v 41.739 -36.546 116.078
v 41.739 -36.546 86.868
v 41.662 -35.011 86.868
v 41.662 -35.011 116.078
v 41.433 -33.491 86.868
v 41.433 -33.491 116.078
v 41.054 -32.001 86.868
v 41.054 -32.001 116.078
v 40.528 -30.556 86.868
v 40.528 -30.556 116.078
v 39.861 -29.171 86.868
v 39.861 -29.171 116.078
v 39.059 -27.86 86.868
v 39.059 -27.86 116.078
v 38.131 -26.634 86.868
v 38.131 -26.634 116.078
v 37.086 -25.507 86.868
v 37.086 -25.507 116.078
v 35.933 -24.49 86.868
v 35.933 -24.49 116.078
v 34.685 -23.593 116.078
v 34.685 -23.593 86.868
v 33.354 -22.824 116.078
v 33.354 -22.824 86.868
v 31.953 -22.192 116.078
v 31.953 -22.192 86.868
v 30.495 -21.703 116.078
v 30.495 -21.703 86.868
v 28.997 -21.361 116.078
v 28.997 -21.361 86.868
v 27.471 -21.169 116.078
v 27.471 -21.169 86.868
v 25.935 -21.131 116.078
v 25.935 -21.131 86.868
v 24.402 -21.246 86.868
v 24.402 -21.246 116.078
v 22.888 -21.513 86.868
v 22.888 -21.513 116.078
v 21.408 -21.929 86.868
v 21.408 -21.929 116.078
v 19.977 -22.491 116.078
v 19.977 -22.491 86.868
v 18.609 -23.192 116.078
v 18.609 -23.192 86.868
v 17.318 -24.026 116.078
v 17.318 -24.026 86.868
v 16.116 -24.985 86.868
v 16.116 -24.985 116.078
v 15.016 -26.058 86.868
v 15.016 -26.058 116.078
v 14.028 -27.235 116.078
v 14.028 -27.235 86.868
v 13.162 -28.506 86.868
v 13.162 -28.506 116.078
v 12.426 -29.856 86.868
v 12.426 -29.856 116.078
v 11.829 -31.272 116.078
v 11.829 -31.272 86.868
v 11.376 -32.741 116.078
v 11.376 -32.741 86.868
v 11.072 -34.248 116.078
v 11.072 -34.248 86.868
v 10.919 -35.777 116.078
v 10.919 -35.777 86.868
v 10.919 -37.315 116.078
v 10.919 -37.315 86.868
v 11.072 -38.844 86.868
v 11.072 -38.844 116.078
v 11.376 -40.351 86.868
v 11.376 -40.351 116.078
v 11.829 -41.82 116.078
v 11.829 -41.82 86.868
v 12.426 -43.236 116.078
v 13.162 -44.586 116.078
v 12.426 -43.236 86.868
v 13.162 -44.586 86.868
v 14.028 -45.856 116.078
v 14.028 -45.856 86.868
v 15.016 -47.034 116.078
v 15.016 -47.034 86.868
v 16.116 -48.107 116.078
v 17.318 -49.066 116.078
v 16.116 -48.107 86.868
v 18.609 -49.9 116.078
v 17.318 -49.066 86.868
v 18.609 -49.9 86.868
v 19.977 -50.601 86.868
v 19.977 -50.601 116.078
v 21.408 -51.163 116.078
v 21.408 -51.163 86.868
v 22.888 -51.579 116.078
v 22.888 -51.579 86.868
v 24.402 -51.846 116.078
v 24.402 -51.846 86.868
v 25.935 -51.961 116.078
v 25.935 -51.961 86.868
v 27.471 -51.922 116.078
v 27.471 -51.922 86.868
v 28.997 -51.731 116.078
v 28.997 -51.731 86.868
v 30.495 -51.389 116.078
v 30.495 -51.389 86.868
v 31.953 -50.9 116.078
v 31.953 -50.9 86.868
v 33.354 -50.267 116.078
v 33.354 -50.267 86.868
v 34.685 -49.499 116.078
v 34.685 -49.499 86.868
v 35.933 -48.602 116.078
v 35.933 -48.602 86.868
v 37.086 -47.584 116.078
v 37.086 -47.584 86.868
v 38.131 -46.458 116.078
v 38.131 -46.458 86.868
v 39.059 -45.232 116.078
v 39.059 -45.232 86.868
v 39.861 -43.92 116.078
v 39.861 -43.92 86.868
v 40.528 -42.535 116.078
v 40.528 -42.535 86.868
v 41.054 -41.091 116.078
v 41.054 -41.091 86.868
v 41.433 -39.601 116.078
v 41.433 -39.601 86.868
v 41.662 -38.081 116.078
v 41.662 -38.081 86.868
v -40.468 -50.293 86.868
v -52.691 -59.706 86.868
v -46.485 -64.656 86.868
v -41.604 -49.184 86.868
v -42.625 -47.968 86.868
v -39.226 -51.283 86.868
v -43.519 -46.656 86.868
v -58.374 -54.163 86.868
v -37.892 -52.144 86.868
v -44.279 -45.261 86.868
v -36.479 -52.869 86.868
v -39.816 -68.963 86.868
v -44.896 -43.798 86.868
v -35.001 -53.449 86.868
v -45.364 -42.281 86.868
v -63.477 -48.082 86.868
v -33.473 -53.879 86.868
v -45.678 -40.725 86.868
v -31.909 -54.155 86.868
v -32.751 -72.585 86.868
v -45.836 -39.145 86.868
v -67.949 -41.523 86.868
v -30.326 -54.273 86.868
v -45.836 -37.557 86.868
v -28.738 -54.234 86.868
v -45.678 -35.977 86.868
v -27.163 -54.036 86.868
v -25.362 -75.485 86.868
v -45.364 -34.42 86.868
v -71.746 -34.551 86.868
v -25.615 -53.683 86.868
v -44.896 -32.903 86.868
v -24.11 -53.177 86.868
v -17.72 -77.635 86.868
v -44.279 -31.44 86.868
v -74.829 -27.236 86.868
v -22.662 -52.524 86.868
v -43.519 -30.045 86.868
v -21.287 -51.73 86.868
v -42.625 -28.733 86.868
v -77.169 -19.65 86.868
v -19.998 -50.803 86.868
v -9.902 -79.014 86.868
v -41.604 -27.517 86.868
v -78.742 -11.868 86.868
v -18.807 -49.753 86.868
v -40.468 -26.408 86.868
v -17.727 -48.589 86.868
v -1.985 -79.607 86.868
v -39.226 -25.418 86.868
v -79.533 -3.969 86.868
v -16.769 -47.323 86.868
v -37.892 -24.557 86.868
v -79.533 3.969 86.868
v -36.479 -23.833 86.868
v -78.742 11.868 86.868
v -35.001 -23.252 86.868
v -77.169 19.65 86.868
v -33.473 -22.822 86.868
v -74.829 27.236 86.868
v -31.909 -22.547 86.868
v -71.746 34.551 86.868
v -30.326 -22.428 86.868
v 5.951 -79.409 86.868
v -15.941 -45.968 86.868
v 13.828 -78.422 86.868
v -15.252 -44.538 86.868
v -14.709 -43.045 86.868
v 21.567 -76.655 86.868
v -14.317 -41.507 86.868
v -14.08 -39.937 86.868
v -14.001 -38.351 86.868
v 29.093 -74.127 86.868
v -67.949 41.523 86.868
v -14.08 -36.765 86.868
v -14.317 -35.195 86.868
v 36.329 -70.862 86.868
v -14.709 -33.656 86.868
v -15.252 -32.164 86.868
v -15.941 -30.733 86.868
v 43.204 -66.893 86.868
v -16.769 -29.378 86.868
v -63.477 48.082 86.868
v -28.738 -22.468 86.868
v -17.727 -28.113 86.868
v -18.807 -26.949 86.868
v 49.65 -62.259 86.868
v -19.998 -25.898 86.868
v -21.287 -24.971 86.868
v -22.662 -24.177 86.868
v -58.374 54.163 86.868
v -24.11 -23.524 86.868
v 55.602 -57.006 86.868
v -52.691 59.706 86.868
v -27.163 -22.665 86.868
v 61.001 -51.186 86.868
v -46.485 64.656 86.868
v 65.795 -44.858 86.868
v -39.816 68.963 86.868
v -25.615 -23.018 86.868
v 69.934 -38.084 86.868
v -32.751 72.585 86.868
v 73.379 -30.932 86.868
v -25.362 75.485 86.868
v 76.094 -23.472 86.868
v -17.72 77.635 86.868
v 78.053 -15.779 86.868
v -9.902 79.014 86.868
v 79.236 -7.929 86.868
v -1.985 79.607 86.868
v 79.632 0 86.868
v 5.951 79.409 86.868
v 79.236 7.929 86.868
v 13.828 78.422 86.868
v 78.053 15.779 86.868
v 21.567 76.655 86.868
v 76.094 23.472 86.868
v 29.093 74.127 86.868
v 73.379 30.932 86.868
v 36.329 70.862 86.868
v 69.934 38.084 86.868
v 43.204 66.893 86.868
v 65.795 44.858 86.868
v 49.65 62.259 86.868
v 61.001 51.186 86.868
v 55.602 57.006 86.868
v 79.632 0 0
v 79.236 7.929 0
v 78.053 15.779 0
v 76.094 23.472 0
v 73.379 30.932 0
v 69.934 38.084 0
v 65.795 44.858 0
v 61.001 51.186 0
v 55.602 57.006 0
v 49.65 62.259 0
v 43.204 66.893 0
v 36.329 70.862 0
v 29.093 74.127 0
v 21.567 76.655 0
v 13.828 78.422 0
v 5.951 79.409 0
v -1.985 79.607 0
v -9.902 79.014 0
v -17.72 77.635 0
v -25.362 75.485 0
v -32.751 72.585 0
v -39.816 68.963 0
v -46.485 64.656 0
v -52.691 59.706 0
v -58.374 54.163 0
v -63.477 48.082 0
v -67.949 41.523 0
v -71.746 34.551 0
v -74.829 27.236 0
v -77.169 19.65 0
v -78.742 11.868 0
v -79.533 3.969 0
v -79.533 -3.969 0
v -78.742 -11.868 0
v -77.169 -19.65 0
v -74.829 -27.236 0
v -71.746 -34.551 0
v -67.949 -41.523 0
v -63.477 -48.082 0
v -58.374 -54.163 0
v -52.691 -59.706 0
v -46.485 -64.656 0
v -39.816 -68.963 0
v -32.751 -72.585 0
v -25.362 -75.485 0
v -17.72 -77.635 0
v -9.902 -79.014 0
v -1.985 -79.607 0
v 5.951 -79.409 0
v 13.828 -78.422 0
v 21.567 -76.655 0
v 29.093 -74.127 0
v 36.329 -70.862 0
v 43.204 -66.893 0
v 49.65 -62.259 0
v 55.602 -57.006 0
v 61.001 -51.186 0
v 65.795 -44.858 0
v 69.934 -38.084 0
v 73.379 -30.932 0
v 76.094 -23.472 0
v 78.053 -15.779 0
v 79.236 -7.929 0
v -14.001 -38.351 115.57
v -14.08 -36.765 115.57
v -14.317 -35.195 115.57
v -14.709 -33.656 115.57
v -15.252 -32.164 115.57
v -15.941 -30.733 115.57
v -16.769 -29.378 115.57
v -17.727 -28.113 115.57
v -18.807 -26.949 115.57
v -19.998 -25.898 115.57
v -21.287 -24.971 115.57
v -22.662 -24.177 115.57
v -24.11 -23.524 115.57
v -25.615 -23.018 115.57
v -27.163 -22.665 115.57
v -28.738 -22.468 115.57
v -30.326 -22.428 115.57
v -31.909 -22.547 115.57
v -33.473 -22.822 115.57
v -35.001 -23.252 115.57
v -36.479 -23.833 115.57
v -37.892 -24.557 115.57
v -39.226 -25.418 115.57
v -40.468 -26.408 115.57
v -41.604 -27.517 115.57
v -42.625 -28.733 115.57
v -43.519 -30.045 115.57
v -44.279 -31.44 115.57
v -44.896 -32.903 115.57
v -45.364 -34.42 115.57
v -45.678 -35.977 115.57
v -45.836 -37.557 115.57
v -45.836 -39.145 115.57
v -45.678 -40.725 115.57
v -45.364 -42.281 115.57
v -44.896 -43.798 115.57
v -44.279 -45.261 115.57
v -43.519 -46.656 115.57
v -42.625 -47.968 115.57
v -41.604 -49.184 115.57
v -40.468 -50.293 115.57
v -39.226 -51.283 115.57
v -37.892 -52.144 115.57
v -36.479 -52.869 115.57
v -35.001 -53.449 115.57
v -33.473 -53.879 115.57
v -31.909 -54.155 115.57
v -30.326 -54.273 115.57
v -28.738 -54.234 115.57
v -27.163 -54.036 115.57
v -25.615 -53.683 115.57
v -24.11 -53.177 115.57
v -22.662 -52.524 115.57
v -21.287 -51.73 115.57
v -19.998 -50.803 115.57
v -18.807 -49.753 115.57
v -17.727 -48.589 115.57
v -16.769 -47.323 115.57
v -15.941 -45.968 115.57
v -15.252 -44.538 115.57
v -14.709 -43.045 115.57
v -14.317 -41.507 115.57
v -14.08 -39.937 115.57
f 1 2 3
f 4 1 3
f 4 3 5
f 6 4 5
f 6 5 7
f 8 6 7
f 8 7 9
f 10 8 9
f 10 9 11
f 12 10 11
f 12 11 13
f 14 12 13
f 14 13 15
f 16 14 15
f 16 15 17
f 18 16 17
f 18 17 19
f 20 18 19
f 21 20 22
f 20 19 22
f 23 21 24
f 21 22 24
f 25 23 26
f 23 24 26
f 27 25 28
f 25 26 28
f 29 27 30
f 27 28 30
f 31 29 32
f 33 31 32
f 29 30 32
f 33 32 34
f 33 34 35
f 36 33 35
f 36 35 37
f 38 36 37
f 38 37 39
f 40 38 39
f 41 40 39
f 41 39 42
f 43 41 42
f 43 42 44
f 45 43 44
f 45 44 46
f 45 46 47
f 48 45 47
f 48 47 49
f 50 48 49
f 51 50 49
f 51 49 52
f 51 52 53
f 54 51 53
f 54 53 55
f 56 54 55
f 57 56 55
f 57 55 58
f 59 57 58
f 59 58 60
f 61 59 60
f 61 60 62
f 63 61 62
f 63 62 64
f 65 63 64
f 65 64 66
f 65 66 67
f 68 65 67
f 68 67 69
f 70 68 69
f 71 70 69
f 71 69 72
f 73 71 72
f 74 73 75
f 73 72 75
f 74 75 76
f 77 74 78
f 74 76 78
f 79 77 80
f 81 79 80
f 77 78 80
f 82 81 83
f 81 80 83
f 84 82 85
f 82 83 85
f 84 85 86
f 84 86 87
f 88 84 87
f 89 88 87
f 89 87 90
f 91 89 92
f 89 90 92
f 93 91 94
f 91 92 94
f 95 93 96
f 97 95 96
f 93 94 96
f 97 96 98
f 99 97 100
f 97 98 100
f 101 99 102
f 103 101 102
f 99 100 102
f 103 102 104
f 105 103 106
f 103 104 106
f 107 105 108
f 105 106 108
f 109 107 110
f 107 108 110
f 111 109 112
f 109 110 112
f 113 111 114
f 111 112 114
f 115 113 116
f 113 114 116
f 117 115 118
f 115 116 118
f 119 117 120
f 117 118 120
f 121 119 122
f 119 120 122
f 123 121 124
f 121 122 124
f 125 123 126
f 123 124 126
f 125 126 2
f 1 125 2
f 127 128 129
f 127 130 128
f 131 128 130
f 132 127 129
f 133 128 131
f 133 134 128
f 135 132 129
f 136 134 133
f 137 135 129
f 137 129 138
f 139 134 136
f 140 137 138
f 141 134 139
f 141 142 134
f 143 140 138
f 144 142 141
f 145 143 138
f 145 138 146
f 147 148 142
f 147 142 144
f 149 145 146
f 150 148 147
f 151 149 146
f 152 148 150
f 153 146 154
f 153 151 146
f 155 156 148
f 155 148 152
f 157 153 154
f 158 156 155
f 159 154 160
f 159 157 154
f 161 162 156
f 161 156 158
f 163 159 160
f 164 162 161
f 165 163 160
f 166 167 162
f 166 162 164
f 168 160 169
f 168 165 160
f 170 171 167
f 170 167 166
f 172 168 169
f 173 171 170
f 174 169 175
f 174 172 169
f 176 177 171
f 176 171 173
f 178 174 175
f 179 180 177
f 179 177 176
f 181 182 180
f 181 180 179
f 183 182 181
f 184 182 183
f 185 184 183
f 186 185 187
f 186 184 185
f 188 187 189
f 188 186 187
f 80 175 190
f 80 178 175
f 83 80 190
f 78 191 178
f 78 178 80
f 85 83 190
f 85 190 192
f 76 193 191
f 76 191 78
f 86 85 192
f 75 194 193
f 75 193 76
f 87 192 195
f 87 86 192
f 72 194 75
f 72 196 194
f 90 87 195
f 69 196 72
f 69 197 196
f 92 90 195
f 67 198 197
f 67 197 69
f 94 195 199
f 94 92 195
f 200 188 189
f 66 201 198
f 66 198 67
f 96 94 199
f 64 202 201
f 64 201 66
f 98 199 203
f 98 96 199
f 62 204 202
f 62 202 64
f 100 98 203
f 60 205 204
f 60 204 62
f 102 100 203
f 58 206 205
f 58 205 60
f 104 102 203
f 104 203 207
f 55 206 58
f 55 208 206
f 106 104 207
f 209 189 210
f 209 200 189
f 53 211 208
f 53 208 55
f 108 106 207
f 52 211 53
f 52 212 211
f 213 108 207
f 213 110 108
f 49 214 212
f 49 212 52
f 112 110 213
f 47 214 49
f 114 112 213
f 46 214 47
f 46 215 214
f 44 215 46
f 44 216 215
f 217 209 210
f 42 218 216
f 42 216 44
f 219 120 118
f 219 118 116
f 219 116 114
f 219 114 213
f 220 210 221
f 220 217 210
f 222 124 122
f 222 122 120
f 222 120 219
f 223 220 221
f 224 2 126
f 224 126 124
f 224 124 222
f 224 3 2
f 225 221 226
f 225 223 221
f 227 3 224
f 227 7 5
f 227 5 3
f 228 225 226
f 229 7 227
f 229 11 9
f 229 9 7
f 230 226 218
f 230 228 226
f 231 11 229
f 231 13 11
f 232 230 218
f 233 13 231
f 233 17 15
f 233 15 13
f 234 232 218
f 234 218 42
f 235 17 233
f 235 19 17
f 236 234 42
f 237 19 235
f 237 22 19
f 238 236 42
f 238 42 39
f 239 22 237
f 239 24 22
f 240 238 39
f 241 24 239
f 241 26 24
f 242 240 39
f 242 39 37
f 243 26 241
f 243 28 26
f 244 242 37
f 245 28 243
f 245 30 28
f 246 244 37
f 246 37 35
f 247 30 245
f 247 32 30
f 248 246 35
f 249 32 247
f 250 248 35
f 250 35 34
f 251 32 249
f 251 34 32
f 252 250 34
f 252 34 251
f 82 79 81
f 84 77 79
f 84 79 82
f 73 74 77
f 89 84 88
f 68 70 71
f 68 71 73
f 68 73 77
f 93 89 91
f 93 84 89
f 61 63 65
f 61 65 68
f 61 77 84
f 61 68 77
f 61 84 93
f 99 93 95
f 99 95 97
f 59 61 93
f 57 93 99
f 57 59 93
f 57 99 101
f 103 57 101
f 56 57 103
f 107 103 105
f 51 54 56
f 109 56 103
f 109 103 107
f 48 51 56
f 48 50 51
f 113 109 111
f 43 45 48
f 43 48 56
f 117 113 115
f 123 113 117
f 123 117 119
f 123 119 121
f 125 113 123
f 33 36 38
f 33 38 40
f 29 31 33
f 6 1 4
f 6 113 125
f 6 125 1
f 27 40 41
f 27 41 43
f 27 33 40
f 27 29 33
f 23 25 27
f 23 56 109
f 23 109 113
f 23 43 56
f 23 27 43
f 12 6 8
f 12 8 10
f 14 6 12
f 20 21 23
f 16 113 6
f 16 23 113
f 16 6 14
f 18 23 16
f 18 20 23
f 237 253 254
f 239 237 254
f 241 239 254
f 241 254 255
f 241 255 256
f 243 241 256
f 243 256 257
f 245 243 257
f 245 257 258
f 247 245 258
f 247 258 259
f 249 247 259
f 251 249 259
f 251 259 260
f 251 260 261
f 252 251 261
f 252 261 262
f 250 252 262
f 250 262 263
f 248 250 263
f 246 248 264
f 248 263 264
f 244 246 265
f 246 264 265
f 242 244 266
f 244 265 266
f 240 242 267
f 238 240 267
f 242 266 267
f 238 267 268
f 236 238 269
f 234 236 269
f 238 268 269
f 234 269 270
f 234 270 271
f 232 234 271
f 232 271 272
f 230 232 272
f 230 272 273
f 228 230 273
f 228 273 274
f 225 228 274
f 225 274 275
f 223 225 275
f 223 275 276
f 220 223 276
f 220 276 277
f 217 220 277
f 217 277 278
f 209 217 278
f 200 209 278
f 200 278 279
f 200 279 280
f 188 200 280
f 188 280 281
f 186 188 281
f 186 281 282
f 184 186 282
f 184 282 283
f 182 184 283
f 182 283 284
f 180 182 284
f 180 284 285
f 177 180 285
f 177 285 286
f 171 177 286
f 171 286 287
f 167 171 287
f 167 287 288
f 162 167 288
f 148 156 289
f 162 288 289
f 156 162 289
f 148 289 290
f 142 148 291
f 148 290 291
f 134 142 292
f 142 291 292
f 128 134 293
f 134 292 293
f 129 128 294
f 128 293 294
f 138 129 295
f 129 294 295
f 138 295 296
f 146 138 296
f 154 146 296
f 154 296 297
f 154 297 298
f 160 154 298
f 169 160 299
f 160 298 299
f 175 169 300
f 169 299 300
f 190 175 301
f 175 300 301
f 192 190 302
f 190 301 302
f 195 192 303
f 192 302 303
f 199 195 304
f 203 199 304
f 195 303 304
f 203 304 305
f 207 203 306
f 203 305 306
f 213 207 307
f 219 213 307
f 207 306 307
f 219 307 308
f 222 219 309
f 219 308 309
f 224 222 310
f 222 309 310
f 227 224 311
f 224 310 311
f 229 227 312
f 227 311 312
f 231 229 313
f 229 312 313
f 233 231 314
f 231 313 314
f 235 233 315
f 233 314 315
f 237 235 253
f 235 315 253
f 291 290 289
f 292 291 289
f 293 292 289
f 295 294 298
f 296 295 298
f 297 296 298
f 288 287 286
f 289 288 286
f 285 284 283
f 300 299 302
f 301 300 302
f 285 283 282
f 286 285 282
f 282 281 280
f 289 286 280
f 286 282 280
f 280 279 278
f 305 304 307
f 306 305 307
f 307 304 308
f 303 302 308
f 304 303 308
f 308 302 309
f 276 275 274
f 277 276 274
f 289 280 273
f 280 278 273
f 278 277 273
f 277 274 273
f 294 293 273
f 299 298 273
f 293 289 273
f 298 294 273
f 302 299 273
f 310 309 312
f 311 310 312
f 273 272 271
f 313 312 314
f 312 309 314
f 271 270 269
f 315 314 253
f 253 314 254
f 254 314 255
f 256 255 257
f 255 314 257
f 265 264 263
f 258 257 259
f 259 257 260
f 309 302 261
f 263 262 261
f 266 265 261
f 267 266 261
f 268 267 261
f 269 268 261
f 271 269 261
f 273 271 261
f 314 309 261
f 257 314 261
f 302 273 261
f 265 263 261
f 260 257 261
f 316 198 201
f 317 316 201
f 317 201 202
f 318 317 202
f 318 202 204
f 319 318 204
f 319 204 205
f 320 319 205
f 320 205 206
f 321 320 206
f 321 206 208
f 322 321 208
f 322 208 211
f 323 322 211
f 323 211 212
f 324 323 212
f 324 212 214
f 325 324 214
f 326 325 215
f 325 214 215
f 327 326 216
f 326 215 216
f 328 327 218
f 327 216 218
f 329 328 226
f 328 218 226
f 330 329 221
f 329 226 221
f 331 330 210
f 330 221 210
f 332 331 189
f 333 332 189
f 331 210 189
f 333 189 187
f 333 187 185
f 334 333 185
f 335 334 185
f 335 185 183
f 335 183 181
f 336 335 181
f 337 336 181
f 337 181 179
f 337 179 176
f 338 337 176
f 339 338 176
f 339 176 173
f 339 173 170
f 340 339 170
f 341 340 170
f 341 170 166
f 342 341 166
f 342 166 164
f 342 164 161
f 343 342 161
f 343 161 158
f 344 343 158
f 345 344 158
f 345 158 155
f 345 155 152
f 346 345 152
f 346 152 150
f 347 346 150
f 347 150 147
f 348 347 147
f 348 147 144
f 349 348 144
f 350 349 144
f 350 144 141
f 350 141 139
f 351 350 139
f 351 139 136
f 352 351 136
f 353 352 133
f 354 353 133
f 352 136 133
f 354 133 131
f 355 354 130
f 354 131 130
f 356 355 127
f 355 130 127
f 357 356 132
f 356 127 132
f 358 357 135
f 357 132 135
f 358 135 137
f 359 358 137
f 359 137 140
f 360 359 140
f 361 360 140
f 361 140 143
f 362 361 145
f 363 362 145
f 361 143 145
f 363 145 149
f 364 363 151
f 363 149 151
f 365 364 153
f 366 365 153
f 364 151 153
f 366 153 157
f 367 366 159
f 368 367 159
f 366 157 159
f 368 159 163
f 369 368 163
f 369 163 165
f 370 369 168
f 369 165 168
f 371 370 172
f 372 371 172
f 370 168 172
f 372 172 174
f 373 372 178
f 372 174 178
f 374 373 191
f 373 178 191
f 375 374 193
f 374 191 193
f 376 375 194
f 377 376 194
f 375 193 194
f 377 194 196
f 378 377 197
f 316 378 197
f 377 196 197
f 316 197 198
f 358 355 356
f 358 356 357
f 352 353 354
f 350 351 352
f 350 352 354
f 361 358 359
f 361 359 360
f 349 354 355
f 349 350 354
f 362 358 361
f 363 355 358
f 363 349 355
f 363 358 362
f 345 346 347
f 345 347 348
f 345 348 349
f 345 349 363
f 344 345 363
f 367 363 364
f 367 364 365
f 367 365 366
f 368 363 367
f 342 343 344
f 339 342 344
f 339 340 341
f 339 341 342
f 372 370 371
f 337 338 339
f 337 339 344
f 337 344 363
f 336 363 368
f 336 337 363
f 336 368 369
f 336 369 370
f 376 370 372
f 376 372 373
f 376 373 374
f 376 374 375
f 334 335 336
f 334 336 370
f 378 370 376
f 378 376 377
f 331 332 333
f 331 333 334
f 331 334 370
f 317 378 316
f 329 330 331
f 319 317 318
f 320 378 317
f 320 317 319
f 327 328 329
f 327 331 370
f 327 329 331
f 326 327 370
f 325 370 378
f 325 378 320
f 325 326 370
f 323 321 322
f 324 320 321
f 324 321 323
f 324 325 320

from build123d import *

# Parameters (mm, degrees)
F0_R     = 79.631708
F6_DEPTH = 86.868
F2_R     = 15.927649
F7_DEPTH = 115.57
F2_R_2   = 15.419675
F8_DEPTH = 116.078
F2_R_3   = 79.631708
F9_DEPTH = 46.736


with BuildPart() as f6:
    # F0 (on Top) → F6 (new body)
    with BuildSketch(Plane.XY):
        Circle(F0_R)
    extrude(amount=F6_DEPTH)

    # F2 (on face) → F7 (join)
    with BuildSketch(Plane.XY):
        with Locations((-29.928552, -38.350657)):
            Circle(F2_R)
    extrude(amount=F7_DEPTH)

    # F2 (on face) → F8 (join)
    with BuildSketch(Plane.XY):
        with Locations((26.319079, -36.545925)):
            Circle(F2_R_2)
    extrude(amount=F8_DEPTH)

    # F2 (on face) → F9 (join)
    with BuildSketch(Plane.XY):
        Circle(F2_R_3)
        with Locations((-29.928552, -38.350657)):
            Circle(F2_R, mode=Mode.SUBTRACT)
        with Locations((26.319079, -36.545925)):
            Circle(F2_R_2, mode=Mode.SUBTRACT)
    extrude(amount=F9_DEPTH)


solid = f6.part
